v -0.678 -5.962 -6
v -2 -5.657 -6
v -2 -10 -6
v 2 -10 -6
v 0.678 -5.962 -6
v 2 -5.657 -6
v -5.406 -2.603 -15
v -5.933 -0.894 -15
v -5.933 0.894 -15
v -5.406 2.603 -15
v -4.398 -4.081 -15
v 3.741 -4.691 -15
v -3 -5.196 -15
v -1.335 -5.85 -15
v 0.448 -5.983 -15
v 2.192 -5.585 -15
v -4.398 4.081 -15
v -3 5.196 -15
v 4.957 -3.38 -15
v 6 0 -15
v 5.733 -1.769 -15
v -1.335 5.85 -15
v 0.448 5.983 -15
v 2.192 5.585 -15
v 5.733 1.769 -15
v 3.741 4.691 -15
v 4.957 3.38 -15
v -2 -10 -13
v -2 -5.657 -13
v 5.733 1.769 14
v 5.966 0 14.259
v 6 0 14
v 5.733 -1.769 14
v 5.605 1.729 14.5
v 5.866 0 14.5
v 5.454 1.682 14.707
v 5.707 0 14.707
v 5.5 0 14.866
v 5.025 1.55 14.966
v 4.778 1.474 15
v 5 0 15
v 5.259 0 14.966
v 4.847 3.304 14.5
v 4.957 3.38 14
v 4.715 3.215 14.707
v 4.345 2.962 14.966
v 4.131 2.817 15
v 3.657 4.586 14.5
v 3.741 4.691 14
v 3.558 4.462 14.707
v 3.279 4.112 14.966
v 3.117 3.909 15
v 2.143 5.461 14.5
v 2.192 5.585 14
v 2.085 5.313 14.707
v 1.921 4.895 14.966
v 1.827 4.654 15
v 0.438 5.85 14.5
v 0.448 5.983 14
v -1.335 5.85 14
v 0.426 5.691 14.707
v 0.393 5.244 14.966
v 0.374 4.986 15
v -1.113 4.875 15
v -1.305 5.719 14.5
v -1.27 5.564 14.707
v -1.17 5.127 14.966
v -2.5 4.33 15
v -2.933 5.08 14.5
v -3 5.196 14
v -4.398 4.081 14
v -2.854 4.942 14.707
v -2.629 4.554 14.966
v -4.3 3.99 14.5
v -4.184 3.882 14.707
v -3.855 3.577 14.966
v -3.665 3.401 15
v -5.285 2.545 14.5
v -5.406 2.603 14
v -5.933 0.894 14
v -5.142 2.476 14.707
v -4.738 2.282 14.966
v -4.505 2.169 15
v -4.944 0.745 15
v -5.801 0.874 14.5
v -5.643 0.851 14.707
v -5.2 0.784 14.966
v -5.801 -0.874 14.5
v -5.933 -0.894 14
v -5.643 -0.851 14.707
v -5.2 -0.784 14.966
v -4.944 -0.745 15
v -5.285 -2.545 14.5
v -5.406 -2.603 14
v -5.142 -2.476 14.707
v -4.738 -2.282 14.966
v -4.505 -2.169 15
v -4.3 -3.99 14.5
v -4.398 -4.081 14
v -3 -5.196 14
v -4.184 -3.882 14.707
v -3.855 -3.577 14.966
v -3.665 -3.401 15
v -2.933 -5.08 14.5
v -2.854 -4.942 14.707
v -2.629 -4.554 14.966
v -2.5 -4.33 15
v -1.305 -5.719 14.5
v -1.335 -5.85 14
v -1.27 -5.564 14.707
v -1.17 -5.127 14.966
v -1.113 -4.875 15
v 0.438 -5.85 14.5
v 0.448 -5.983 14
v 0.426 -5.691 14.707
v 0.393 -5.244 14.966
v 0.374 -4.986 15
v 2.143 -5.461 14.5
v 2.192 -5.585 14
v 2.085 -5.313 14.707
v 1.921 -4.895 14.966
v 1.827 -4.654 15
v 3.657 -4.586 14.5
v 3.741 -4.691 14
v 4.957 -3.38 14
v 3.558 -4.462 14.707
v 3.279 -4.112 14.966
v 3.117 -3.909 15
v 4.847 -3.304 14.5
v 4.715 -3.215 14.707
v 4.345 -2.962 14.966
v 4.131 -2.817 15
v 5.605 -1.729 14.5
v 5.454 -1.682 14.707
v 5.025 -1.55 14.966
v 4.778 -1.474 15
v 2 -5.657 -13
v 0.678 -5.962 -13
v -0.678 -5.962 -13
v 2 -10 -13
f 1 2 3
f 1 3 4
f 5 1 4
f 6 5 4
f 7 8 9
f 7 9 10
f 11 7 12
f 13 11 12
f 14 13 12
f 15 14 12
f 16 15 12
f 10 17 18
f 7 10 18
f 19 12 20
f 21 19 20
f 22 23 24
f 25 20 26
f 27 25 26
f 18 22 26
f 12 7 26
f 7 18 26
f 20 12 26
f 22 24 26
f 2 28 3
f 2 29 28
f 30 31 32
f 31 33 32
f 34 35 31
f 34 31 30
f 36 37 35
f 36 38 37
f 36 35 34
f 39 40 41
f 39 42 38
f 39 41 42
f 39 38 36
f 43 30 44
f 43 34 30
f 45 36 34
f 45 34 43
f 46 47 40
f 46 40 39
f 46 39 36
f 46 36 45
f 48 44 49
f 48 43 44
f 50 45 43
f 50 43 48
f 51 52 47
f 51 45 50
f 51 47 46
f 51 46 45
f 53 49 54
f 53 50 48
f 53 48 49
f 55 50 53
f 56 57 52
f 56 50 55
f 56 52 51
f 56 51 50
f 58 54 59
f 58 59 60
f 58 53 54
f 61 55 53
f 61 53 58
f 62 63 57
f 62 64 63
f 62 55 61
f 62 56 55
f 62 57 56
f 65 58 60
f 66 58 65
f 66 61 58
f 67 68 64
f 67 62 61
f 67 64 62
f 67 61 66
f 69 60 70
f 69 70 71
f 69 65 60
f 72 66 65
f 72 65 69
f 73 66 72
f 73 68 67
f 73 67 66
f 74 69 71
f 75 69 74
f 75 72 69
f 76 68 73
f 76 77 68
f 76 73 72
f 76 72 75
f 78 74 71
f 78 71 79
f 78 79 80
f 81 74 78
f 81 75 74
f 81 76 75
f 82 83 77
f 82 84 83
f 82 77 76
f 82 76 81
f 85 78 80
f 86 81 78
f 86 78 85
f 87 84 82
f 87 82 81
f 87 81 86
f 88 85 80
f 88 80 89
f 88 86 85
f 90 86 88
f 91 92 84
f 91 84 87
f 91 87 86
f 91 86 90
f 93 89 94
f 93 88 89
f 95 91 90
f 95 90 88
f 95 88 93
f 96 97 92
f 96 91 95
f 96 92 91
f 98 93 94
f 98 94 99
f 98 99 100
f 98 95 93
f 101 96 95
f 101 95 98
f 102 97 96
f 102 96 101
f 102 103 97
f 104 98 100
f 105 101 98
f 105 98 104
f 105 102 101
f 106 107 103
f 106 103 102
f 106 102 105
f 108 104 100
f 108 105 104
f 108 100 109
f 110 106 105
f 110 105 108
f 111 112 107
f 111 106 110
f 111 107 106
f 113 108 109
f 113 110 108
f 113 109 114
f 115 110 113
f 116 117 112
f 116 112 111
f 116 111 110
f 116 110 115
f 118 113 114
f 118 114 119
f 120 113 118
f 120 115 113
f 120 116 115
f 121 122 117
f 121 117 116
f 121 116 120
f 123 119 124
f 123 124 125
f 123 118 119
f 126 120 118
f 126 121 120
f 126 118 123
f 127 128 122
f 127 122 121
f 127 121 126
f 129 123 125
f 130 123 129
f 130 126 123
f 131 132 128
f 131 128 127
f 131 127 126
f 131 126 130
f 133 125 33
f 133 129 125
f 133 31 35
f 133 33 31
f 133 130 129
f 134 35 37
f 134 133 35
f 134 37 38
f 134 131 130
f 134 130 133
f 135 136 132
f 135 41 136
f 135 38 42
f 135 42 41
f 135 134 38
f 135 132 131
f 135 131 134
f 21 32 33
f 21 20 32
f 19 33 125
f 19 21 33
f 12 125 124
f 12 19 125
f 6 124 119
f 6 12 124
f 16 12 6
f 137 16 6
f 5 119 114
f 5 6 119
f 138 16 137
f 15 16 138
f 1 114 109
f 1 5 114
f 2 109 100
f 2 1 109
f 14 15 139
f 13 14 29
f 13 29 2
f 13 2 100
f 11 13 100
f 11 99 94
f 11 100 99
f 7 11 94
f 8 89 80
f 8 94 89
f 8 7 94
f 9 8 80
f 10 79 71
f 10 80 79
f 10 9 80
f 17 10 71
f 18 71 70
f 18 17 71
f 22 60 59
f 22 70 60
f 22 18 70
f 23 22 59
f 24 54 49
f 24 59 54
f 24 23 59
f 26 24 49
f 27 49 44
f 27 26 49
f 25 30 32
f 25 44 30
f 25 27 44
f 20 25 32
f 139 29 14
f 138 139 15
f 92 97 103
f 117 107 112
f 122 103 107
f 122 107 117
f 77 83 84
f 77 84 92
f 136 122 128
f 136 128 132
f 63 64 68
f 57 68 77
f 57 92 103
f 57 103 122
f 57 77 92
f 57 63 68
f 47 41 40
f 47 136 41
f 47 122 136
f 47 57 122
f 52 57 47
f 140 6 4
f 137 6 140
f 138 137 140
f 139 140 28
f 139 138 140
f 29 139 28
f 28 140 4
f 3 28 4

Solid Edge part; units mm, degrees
sketch "Sketch1" plane through (0, 0, 0) normal (0, 0, 1) x (1, 0, 0)
  circle A0 centre (0, 0) radius 6
extrude "Protrusion1" add sketch "Sketch1" along normal mid plane 30
sketch "Sketch2" plane through (0, 0, 0) normal (0, -1, 0) x (1, 0, 0)
  line L0 (2, -13) -> (-2, -13)
  line L1 (-2, -13) -> (-2, -6)
  line L2 (-2, -6) -> (2, -6)
  line L3 (2, -6) -> (2, -13)
extrude "ExtrudedProtrusion_2" add sketch "Sketch2" along normal blind 10
fillet "Round_1" radius 1 1 edges at (-6, 0, 15)
properties material "PVC"
